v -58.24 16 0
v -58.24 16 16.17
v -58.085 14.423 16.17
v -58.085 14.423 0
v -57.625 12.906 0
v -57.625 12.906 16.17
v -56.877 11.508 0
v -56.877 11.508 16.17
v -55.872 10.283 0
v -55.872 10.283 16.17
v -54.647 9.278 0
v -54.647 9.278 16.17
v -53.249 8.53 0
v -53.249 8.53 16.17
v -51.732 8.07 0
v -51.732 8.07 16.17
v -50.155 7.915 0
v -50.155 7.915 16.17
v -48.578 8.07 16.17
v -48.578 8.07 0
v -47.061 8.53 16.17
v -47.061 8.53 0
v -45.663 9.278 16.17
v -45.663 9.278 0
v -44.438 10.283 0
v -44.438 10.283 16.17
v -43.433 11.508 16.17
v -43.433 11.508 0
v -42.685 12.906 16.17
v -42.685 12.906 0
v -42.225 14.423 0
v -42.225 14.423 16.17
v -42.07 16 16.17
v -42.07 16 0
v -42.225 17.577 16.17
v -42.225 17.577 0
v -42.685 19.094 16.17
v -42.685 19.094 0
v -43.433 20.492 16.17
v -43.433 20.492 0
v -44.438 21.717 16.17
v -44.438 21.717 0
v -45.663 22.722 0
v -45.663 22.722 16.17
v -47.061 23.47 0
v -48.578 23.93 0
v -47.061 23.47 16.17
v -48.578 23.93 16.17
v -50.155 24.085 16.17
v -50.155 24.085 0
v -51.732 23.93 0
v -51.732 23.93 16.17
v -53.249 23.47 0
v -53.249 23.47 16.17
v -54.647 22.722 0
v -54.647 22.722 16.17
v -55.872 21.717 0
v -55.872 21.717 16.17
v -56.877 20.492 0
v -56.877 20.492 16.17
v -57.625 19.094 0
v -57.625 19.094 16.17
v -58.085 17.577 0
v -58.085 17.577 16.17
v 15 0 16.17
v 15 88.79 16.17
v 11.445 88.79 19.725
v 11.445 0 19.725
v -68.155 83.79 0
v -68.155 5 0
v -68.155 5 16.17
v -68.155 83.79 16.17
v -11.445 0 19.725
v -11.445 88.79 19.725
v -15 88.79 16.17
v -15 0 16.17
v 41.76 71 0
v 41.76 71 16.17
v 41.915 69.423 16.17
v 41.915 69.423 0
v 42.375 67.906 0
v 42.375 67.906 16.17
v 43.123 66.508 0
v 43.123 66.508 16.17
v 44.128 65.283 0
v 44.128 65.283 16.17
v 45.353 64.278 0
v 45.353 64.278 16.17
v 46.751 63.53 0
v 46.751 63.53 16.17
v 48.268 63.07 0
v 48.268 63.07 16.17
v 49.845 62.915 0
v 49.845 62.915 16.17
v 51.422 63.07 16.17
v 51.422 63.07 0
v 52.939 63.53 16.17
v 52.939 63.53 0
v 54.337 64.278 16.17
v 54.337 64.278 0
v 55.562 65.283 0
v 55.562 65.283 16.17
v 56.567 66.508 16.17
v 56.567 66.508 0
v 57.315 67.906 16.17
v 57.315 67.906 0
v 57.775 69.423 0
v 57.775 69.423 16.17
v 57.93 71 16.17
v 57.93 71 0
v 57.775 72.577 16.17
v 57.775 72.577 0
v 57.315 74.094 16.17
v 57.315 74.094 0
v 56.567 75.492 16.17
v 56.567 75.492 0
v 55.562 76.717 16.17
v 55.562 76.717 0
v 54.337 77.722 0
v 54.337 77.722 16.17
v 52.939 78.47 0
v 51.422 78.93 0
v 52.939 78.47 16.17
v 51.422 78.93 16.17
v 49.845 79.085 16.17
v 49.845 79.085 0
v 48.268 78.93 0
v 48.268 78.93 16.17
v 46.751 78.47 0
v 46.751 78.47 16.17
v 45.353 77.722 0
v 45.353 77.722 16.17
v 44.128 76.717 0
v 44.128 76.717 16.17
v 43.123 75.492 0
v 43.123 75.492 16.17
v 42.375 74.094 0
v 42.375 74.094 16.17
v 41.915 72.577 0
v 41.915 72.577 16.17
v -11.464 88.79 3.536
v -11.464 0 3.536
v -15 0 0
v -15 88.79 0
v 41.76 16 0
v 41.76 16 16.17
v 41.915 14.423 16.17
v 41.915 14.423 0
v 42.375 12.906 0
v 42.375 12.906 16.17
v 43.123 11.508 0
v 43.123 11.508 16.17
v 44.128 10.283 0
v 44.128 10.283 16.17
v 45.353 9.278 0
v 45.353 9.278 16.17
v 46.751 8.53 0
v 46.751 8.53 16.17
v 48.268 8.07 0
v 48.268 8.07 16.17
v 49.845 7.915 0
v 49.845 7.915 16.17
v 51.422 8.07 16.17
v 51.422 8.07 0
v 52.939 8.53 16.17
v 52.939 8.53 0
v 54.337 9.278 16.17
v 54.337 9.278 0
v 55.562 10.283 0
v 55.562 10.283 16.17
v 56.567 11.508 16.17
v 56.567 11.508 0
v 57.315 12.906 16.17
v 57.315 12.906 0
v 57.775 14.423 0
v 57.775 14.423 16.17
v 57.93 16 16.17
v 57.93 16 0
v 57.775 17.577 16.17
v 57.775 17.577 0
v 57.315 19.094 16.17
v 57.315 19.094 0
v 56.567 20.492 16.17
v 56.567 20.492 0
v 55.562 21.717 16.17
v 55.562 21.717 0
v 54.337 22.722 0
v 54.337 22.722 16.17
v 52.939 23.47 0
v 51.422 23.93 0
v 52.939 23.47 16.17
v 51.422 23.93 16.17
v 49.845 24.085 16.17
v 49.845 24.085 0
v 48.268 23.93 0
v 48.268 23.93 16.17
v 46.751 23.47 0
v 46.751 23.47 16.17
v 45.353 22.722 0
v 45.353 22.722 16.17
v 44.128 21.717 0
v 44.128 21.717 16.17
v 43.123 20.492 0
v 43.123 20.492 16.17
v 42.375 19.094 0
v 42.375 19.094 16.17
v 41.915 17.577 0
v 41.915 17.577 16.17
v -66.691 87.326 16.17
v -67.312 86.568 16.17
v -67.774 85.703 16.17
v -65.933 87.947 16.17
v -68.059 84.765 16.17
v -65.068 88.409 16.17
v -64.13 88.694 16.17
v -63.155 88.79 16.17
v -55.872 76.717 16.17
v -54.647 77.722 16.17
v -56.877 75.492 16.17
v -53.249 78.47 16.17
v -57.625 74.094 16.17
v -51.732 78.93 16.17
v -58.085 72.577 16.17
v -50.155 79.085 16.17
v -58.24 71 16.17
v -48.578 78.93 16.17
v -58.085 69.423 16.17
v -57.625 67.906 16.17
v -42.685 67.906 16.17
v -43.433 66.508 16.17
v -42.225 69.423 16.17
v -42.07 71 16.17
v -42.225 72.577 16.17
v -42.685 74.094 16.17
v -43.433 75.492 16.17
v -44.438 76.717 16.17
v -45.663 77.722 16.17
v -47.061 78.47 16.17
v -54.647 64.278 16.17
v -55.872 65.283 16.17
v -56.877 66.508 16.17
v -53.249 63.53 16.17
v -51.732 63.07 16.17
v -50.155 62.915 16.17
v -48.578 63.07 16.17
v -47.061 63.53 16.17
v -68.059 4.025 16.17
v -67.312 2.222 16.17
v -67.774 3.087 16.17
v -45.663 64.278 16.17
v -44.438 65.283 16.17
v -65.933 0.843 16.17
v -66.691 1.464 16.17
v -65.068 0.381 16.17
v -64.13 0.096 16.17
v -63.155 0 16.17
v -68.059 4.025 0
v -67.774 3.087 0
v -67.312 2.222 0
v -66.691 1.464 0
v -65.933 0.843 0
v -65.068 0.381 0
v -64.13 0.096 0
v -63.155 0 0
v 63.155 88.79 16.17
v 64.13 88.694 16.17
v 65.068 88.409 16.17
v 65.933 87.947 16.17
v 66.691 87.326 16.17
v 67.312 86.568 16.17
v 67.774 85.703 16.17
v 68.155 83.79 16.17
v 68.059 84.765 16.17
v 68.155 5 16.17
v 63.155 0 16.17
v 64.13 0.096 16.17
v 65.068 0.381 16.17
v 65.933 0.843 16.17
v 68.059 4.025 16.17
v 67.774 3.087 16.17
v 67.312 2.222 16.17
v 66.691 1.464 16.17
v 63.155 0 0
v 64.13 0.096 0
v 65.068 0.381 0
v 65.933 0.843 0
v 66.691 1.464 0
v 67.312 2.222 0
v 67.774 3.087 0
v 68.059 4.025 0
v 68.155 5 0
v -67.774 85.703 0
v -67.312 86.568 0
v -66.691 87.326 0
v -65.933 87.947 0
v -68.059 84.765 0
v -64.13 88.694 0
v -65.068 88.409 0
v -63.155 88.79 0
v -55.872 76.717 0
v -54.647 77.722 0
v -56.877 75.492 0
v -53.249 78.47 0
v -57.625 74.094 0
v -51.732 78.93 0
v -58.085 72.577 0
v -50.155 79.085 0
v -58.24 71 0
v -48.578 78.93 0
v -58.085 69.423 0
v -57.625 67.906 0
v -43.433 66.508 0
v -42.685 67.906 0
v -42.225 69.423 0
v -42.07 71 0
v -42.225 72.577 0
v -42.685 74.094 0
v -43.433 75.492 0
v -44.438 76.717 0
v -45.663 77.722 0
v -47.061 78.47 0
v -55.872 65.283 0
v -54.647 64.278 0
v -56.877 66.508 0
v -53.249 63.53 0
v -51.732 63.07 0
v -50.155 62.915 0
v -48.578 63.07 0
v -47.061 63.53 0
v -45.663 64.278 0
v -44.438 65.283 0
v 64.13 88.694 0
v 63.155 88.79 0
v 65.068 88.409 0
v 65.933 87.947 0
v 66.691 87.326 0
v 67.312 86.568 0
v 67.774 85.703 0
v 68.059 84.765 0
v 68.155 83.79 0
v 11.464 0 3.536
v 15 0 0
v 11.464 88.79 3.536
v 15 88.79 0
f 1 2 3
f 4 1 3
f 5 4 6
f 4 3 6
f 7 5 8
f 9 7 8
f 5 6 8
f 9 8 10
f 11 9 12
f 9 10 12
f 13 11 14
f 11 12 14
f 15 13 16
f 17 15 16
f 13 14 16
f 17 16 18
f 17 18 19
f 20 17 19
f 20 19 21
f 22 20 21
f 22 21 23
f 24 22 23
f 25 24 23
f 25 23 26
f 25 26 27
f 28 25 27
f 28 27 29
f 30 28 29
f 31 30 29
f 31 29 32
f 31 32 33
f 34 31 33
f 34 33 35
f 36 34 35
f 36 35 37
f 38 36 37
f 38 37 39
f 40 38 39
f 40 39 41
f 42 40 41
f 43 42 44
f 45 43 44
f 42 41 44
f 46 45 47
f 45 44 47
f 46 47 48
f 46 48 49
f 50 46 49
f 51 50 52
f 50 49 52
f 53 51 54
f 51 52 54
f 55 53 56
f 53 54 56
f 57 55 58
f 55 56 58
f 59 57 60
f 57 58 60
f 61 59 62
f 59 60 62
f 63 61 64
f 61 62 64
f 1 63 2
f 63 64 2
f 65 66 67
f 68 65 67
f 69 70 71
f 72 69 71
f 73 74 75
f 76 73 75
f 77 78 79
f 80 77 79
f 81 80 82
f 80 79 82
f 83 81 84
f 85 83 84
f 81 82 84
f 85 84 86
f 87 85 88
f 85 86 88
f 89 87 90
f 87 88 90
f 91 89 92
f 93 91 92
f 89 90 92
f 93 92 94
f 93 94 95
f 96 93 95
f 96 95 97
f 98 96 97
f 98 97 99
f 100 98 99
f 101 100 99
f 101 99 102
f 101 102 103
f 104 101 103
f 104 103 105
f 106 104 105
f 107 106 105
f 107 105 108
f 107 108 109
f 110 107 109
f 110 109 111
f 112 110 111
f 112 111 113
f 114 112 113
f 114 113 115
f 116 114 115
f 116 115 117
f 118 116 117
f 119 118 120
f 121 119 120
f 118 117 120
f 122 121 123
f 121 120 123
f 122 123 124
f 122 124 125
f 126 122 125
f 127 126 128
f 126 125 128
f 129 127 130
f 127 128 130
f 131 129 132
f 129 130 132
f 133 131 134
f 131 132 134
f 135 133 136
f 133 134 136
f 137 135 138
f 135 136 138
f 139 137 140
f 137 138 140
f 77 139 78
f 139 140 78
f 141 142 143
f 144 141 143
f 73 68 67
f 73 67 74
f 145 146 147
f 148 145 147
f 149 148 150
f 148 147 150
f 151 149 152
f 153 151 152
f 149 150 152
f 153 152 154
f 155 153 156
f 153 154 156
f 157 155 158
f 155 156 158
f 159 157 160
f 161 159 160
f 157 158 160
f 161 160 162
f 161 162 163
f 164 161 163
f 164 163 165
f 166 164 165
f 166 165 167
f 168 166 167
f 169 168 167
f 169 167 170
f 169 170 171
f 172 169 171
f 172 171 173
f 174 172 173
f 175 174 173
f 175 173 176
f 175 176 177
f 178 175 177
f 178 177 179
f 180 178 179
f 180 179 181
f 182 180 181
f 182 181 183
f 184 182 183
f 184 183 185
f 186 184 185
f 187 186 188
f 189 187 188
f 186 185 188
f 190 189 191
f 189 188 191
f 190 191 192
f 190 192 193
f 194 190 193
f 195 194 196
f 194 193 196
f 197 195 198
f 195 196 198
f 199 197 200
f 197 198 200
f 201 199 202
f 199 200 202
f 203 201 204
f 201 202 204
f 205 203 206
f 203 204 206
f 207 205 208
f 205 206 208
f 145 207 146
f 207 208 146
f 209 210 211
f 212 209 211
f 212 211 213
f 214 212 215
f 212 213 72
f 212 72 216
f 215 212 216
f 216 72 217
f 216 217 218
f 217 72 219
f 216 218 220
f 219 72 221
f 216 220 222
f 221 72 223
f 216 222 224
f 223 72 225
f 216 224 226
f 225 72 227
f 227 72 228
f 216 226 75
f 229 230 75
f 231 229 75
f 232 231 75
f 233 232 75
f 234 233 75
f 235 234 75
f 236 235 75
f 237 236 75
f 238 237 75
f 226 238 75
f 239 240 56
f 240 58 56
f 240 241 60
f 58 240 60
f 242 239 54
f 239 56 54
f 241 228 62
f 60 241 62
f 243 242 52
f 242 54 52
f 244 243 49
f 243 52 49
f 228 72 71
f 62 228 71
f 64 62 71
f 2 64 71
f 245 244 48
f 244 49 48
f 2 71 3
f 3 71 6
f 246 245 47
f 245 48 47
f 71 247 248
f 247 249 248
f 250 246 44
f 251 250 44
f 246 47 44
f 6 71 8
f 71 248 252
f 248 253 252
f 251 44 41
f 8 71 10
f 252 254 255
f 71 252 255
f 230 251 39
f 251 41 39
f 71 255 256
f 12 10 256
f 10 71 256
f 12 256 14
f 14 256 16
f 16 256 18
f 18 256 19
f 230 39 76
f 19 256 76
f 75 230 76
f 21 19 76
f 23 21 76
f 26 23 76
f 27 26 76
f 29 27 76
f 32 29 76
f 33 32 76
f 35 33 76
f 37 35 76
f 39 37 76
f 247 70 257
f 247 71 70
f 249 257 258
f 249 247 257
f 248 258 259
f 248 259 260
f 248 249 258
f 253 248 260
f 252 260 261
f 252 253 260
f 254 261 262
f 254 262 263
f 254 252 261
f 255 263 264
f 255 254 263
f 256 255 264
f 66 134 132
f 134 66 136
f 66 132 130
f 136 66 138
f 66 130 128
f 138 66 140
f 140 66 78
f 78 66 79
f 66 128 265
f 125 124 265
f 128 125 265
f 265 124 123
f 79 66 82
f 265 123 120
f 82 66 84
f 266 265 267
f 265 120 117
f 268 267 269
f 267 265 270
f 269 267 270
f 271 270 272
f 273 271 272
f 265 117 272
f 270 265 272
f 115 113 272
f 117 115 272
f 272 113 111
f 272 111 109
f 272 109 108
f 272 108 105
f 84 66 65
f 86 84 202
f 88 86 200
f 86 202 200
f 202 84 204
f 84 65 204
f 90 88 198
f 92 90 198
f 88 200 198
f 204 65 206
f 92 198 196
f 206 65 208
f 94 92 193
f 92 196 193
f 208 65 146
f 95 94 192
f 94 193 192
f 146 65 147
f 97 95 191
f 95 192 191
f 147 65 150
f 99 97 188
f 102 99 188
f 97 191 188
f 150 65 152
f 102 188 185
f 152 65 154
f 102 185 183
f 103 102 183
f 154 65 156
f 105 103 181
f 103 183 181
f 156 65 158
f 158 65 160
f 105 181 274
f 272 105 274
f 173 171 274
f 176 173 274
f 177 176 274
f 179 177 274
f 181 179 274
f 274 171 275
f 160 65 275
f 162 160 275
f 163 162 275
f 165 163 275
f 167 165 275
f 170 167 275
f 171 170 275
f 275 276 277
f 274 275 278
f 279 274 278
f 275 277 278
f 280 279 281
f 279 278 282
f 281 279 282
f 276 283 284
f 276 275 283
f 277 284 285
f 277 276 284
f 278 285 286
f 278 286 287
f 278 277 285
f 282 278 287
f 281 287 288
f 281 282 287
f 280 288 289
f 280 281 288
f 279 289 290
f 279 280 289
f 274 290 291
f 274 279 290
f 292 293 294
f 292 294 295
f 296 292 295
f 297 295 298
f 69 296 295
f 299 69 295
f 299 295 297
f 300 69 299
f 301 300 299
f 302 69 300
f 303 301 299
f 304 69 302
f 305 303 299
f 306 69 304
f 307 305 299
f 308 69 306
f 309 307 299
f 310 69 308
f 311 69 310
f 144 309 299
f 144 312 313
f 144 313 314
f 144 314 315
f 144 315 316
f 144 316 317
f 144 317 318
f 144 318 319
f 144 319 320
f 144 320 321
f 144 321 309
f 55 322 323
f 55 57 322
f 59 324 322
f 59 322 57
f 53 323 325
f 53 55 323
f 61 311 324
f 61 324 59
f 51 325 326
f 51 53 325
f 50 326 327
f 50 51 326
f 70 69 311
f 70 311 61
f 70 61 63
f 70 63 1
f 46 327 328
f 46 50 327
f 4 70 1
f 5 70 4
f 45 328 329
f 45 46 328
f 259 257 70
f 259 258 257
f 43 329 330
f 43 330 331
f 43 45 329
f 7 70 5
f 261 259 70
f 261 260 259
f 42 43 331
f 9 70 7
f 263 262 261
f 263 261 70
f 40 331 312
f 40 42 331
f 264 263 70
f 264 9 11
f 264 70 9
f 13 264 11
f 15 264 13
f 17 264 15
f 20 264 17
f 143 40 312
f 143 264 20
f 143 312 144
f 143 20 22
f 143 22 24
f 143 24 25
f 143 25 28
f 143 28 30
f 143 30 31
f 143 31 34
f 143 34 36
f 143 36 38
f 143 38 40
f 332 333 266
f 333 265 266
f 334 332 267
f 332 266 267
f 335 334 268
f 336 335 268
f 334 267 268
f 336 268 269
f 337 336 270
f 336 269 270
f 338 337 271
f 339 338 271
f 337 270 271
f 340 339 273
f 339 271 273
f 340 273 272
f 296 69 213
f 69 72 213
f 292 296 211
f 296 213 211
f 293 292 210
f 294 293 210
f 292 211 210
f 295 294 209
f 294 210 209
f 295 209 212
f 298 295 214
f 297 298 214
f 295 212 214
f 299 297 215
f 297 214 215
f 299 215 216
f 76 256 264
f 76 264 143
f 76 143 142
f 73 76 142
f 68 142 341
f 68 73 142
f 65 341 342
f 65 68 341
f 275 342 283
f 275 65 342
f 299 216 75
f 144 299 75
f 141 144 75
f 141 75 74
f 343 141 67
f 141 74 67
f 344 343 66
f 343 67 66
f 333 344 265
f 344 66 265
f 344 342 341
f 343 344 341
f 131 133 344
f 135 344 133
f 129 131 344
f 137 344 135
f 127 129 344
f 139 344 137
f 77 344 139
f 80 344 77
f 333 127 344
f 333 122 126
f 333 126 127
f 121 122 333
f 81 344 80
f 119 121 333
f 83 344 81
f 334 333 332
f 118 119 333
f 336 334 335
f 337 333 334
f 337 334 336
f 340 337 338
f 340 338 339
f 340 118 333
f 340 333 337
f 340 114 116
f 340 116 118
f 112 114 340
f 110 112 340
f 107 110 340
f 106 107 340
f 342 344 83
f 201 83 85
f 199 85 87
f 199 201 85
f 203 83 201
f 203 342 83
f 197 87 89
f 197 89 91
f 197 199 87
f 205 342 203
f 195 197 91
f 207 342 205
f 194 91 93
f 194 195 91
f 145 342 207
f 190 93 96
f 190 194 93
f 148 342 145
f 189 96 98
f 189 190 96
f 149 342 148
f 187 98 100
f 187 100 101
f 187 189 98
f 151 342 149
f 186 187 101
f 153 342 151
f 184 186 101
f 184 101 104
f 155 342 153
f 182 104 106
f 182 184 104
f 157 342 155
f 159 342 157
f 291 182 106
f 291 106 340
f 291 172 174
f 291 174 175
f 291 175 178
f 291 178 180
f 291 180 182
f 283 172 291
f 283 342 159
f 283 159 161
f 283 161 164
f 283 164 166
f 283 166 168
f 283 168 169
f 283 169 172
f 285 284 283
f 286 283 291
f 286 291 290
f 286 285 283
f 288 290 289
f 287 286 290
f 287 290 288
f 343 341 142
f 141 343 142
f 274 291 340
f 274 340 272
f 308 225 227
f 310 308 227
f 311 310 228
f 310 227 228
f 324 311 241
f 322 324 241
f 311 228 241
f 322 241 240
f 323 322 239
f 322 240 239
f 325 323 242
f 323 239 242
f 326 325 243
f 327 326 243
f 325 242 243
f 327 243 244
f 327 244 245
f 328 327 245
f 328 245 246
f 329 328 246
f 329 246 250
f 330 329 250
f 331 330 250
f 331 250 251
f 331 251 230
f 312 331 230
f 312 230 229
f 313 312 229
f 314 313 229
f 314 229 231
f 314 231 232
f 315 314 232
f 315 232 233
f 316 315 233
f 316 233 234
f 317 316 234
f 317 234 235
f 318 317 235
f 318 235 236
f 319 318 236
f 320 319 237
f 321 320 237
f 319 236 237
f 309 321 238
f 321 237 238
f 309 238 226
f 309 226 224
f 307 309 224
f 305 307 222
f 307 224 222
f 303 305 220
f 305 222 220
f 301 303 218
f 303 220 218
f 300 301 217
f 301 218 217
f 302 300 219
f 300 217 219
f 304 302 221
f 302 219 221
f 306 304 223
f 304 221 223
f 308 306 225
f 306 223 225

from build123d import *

# Parameters (mm, degrees)
F0_W     = 136.31
F0_H     = 16.17
F1_DEPTH = 88.79
F3_DEPTH = 88.79
F5_DEPTH = 88.79
F6_R     = 5
F8_D     = 16.17


with BuildPart() as f1:
    # F0 (on Front) → F1 (new body)
    with BuildSketch(Plane.XZ):
        with Locations((0, 8.085)):
            Rectangle(F0_W, F0_H)
    extrude(amount=-F1_DEPTH)

    # F2 (on face) → F3 (join)
    with BuildSketch(Plane.XZ):
        Polygon((-15, 16.17), (0, 16.17), (15, 16.17), (11.445, 19.725), (-11.445, 19.725), align=None)
    extrude(amount=-F3_DEPTH)

    # F4 (on Front) → F5 (cut)
    with BuildSketch(Plane.XZ):
        Polygon((-15, 0), (0, 0), (15, 0), (11.4644660941, 3.5355339059), (-11.4644660941, 3.5355339059), align=None)
    extrude(amount=-F5_DEPTH, mode=Mode.SUBTRACT)

    # F6
    f6_edges = [f1.edges().sort_by_distance(p)[0] for p in [
        (68.155, 88.79, 8.085),
        (-68.155, 88.79, 8.085),
        (68.155, 0, 8.085),
        (-68.155, 0, 8.085),
    ]]
    fillet(f6_edges, radius=F6_R)

    # F8 (through all)
    with Locations(Plane(origin=(0, 0, 0), x_dir=(1, 0, 0), z_dir=(0, 0, -1))):
        with Locations((-50.155, -71), (-50.155, -16), (49.845, -71), (49.845, -16)):
            Hole(F8_D / 2)


solid = f1.part
